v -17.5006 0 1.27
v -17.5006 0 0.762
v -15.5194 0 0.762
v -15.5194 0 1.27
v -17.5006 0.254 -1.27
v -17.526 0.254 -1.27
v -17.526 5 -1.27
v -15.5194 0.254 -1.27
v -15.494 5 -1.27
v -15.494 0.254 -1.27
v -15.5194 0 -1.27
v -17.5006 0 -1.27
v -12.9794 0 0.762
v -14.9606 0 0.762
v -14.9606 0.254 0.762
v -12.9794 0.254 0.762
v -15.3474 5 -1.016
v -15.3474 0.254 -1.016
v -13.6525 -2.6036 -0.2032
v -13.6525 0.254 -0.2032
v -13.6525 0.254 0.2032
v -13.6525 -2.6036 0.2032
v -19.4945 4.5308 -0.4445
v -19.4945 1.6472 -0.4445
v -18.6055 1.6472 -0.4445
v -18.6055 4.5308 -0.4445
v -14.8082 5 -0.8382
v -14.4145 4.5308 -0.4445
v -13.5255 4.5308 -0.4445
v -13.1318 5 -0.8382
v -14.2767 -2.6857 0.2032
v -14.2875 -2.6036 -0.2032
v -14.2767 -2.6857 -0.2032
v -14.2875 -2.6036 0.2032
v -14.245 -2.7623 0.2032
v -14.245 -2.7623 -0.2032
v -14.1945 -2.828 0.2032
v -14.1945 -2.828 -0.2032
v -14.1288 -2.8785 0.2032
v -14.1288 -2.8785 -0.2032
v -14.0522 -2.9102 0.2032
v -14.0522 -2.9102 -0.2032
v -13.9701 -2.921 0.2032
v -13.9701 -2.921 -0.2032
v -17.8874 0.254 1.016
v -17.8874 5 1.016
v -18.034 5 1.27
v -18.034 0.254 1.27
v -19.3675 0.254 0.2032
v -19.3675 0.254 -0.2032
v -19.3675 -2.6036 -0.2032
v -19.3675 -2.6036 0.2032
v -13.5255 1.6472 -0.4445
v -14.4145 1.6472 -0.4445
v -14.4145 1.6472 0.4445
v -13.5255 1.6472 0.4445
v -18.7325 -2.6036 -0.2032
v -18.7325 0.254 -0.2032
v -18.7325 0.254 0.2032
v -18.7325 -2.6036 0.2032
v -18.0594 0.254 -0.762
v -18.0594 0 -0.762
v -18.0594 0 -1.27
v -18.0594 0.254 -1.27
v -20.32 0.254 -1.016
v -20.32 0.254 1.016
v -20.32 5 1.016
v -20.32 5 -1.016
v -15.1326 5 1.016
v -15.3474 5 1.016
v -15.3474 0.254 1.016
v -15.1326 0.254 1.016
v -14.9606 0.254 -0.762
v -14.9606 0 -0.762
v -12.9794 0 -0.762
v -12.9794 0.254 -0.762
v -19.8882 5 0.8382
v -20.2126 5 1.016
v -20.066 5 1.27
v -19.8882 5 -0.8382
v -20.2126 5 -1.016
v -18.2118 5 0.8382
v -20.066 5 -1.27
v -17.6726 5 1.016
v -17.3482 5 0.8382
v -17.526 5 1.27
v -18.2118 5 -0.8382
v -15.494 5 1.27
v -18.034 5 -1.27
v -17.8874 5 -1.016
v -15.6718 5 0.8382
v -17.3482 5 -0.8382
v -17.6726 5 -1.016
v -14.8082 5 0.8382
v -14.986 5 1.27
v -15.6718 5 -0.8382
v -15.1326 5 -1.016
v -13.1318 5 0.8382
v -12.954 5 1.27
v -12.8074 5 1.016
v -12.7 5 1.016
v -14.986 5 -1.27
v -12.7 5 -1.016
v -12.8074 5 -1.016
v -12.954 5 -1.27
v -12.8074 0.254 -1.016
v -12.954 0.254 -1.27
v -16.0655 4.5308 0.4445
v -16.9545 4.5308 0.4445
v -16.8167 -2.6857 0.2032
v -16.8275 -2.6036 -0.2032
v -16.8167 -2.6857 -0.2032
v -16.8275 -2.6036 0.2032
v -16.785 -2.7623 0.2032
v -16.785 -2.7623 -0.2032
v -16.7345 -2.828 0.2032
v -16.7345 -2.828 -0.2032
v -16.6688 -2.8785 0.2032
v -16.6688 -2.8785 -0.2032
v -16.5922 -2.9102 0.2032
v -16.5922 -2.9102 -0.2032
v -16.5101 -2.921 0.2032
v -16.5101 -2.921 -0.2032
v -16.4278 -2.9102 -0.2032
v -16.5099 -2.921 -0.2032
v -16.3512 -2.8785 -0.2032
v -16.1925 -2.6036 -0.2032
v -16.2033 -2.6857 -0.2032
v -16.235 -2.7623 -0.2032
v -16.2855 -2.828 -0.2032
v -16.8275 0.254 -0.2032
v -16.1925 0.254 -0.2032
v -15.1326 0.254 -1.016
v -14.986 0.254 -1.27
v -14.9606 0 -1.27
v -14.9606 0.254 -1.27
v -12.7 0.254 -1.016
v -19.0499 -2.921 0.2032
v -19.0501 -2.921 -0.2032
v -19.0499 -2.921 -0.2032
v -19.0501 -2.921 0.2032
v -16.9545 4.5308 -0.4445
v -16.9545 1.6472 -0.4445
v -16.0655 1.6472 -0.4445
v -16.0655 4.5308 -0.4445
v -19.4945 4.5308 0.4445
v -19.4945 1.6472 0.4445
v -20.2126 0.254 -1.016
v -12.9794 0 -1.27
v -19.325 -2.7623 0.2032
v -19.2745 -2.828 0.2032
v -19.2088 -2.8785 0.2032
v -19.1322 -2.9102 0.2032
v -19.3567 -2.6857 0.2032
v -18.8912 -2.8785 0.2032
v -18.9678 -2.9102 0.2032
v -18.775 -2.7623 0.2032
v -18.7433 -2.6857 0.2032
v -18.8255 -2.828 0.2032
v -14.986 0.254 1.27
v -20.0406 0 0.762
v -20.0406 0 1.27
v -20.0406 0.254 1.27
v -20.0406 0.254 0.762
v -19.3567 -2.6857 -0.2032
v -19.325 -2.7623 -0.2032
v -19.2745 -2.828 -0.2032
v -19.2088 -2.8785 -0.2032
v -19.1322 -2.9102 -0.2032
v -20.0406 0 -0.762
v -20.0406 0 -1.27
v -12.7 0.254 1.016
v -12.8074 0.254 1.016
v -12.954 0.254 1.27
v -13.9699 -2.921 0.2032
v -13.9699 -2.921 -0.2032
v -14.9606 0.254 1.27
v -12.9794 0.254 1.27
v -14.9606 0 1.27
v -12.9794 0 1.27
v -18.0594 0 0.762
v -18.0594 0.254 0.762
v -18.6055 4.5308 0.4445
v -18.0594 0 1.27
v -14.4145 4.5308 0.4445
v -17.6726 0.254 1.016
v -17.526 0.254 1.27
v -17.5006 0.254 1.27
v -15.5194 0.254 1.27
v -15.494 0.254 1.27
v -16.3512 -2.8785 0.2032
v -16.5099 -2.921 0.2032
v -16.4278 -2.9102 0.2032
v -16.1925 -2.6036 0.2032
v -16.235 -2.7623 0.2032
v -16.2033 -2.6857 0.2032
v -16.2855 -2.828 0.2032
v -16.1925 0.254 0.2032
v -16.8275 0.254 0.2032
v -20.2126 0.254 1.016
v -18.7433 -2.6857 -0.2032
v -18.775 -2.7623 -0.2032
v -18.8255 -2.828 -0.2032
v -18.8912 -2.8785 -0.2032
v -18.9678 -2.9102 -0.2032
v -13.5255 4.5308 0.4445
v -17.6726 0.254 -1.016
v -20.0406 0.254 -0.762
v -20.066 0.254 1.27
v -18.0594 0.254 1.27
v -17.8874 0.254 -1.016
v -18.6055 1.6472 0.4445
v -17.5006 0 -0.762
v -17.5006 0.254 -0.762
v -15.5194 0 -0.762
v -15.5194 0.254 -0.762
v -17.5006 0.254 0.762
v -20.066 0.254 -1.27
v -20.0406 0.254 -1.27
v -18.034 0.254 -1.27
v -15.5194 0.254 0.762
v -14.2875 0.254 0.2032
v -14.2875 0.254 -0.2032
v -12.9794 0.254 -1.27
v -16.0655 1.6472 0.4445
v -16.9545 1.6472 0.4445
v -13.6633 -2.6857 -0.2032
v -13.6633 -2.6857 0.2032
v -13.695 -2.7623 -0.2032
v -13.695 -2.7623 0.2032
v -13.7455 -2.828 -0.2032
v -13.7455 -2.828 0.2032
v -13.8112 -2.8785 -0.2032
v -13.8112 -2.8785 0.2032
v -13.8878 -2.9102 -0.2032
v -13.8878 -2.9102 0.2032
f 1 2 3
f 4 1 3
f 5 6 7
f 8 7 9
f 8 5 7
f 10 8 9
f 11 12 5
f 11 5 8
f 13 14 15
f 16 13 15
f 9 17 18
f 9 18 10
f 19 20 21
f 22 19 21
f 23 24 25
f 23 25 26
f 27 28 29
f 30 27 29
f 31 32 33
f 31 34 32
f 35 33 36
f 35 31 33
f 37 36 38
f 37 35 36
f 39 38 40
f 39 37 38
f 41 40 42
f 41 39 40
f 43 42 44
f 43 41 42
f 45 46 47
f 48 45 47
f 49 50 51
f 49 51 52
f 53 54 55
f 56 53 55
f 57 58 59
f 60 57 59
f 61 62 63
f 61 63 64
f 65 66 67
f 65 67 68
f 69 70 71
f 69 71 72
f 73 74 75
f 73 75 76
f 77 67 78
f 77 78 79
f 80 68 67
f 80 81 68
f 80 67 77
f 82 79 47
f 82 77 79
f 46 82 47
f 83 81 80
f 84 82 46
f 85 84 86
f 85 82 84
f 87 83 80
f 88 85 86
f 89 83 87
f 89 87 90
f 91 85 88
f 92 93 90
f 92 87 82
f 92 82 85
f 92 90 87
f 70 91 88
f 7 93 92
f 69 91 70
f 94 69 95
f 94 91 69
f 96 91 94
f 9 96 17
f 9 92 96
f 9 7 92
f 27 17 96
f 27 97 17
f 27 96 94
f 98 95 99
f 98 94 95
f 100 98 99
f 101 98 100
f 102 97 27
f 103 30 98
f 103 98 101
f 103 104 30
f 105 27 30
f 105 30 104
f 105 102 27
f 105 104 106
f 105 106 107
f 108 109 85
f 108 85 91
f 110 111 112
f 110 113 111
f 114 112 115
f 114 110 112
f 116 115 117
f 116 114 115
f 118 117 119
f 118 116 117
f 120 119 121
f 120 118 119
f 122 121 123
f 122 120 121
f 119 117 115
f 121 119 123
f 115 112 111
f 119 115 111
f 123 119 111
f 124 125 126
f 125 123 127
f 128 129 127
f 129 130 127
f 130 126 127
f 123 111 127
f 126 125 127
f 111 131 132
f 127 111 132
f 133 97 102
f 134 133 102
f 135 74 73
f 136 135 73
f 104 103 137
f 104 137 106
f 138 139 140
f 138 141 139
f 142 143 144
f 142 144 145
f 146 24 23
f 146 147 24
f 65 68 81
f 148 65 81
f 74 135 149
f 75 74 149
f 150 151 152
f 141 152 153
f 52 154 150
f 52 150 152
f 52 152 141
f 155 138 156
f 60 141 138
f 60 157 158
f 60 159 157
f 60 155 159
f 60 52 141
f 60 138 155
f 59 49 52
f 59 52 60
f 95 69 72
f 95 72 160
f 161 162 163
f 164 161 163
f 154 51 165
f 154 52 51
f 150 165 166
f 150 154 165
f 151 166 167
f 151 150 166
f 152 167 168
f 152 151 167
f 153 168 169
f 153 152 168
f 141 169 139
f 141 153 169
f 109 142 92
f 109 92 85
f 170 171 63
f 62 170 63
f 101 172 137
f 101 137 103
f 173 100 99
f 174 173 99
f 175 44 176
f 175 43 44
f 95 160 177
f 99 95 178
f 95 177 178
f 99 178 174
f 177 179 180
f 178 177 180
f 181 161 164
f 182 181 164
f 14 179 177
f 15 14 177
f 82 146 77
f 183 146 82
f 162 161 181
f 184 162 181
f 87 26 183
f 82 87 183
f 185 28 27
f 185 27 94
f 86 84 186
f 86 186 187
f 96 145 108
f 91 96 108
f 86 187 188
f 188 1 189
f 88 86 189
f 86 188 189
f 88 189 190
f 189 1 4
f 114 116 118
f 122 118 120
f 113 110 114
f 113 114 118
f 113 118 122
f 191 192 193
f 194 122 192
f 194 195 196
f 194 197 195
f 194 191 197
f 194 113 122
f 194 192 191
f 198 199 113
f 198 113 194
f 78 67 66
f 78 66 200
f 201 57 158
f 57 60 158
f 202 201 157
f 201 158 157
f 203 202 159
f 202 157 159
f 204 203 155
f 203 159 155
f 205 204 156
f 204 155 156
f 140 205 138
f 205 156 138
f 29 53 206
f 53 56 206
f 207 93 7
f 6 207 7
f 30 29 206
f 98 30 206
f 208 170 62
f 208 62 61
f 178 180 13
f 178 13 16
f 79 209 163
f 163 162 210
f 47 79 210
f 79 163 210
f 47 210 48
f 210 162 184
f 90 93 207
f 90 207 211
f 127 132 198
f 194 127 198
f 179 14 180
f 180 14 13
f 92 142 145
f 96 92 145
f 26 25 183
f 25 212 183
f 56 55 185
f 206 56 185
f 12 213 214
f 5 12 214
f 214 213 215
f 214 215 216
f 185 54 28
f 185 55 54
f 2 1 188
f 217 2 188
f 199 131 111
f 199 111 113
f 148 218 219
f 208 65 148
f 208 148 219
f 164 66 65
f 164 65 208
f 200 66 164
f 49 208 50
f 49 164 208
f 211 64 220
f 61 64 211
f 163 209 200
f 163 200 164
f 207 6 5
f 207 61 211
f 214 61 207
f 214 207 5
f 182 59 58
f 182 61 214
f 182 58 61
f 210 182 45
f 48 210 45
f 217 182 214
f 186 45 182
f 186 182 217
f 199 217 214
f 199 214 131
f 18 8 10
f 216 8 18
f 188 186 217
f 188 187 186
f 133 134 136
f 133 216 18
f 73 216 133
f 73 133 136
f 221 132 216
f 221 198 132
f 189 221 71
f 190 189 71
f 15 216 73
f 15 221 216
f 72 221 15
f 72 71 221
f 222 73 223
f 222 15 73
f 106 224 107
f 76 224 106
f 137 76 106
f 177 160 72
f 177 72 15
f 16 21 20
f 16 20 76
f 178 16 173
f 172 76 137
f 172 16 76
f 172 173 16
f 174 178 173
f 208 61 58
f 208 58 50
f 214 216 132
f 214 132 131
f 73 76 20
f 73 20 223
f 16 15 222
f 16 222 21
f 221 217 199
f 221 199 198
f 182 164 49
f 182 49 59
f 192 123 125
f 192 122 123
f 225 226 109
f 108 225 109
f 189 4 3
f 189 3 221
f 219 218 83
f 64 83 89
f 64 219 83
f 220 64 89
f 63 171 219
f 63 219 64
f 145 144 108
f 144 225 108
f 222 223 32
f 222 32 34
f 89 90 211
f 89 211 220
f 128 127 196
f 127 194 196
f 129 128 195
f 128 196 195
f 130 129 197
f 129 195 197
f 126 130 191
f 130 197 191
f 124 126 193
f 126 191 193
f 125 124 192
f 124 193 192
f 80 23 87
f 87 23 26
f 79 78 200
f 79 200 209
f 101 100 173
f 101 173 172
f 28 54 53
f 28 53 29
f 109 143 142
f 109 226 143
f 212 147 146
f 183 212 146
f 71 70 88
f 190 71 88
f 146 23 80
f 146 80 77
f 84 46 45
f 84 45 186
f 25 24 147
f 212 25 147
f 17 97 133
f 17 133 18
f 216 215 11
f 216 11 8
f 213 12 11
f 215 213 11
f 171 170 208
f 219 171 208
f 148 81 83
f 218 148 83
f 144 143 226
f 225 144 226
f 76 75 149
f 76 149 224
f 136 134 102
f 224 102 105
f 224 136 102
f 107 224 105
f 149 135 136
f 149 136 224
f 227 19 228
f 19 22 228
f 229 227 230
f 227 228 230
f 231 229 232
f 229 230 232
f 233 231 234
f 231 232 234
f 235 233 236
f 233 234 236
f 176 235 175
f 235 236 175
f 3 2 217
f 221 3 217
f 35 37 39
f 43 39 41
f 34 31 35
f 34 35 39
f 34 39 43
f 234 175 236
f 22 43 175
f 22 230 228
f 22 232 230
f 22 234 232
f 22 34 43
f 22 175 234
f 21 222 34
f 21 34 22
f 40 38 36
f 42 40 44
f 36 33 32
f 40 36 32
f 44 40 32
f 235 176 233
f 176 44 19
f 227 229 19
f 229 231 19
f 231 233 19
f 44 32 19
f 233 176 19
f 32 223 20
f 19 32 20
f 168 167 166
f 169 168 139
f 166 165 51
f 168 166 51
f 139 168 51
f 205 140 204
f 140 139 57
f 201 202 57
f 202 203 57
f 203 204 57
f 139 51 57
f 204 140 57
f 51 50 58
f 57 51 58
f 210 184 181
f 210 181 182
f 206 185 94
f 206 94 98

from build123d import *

# Parameters (mm, degrees)
SKETCH1_W                      = 40.64
SKETCH1_H                      = 2.54
BASE_EXTRUDE_DEPTH             = 5
SKETCH2_W                      = 1.524
SKETCH2_H                      = 0.254
STANDOFF_WIDTH_DEPTH           = 41.966114046
UPPER_START                    = -19.4945
UPPER_CORE_OUTLINE_W           = 3.3528
UPPER_CORE_OUTLINE_H           = 0.889
UPPER_CORE_DEPTH               = 0.889
LEAD_IN_SIZE                   = 0.3937
LEAD_IN_SIZE2                  = 0.469193389
CORE_PATTERN_COUNT             = 16
CORE_PATTERN_PITCH             = 2.54
LEAD_IN_OF_CORE_PATTERN_SIZE2  = 0.469193389
LEAD_IN_OF_CORE_PATTERN_SIZE   = 0.3937
POSITION_CUT_DEPTH             = 21.964620197
SKETCH10_W                     = 0.2794
SKETCH10_H                     = 0.254
STANDOFF_LENGTH_DEPTH          = 22.07970588
STANDOFF_PATTERN_COUNT         = 16
STANDOFF_PATTERN_PITCH         = 2.54
SKETCH11_W                     = 0.635
SKETCH11_H                     = 0.4064
TAIL_DEPTH                     = 3.175
TAIL_FILLETS_R                 = 0.3175
TAIL_PATTERN_COUNT             = 16
TAIL_PATTERN_PITCH             = 2.54
TAIL_FILLETS_OF_TAIL_PATTERN_R = 0.3175
SKETCH12_W                     = 33.02
SKETCH12_H                     = 7.921
CUT_EXTRUDE1_DEPTH             = 22.07970588


# Read off the part's stored shape, not the designer's step: Upper Core
with BuildPart() as part:
    # Sketch1 → Base-Extrude (new body)
    with BuildSketch(Plane(origin=(0, 0, 0), x_dir=(1, 0, 0), z_dir=(0, 1, 0))):
        Rectangle(SKETCH1_W, SKETCH1_H)
    extrude(amount=BASE_EXTRUDE_DEPTH)

    # Sketch2 → Standoff - Width (cut, through all)
    with BuildSketch(Plane.ZY.offset(20.32)):
        with Locations((0, 0.127)):
            Rectangle(SKETCH2_W, SKETCH2_H)
    extrude(amount=-STANDOFF_WIDTH_DEPTH, mode=Mode.SUBTRACT)

    # Upper Core outline → Upper Core (cut)
    with BuildSketch(Plane.YZ.offset(UPPER_START)):
        with Locations((3.3236, 0)):
            Rectangle(UPPER_CORE_OUTLINE_W, UPPER_CORE_OUTLINE_H)
    upper_core = extrude(amount=UPPER_CORE_DEPTH, mode=Mode.SUBTRACT)

    # Lead-in
    lead_in_edges = [part.edges().sort_by_distance(p)[0] for p in [
        (-19.4945, 5, 0),
        (-19.05, 5, 0.4445),
        (-18.6055, 5, 0),
        (-19.05, 5, -0.4445),
    ]]
    lead_in_side = [part.faces().sort_by_distance(p)[0] for p in [
        (0.146976854, 5, 0),
    ]]
    chamfer(lead_in_edges, length=LEAD_IN_SIZE, length2=LEAD_IN_SIZE2, reference=lead_in_side[0])

    # Core Pattern: Upper Core ×16
    with Locations(*[(i * CORE_PATTERN_PITCH, 0, 0) for i in range(1, CORE_PATTERN_COUNT)]):
        add(upper_core, mode=Mode.SUBTRACT)

    # Lead-in of Core Pattern
    lead_in_of_core_pattern_edges = [part.edges().sort_by_distance(p)[0] for p in [
        (-16.9545, 5, 0),
        (-16.51, 5, 0.4445),
        (-16.0655, 5, 0),
        (-16.51, 5, -0.4445),
        (-14.4145, 5, 0),
        (-13.97, 5, 0.4445),
        (-13.5255, 5, 0),
        (-13.97, 5, -0.4445),
        (-11.8745, 5, 0),
        (-11.43, 5, 0.4445),
        (-10.9855, 5, 0),
        (-11.43, 5, -0.4445),
        (-9.3345, 5, 0),
        (-8.89, 5, 0.4445),
        (-8.4455, 5, 0),
        (-8.89, 5, -0.4445),
        (-6.7945, 5, 0),
        (-6.35, 5, 0.4445),
        (-5.9055, 5, 0),
        (-6.35, 5, -0.4445),
        (-4.2545, 5, 0),
        (-3.81, 5, 0.4445),
        (-3.3655, 5, 0),
        (-3.81, 5, -0.4445),
        (-1.7145, 5, 0),
        (-1.27, 5, 0.4445),
        (-0.8255, 5, 0),
        (-1.27, 5, -0.4445),
        (0.8255, 5, 0),
        (1.27, 5, 0.4445),
        (1.7145, 5, 0),
        (1.27, 5, -0.4445),
        (3.3655, 5, 0),
        (3.81, 5, 0.4445),
        (4.2545, 5, 0),
        (3.81, 5, -0.4445),
        (5.9055, 5, 0),
        (6.35, 5, 0.4445),
        (6.7945, 5, 0),
        (6.35, 5, -0.4445),
        (8.4455, 5, 0),
        (8.89, 5, 0.4445),
        (9.3345, 5, 0),
        (8.89, 5, -0.4445),
        (10.9855, 5, 0),
        (11.43, 5, 0.4445),
        (11.8745, 5, 0),
        (11.43, 5, -0.4445),
        (13.5255, 5, 0),
        (13.97, 5, 0.4445),
        (14.4145, 5, 0),
        (13.97, 5, -0.4445),
        (16.0655, 5, 0),
        (16.51, 5, 0.4445),
        (16.9545, 5, 0),
        (16.51, 5, -0.4445),
        (18.6055, 5, 0),
        (19.05, 5, 0.4445),
        (19.4945, 5, 0),
        (19.05, 5, -0.4445),
    ]]
    chamfer(lead_in_of_core_pattern_edges, length=LEAD_IN_OF_CORE_PATTERN_SIZE, length2=LEAD_IN_OF_CORE_PATTERN_SIZE2)

    # Sketch4 → Position Cut (cut, through all)
    with BuildSketch(Plane(origin=(0, 5, 0), x_dir=(-1, 0, 0), z_dir=(0, 1, 0))):
        Polygon((20.32, 1.016), (20.212646968, 1.016), (20.066, 1.27), (20.32, 1.27), align=None)
        Polygon((20.066, -1.27), (20.32, -1.27), (20.32, -1.016), (20.212646968, -1.016), align=None)
        Polygon((17.78, -1.016), (17.887353032, -1.016), (18.034, -1.27), (17.78, -1.27), align=None)
        Polygon((18.034, 1.27), (17.78, 1.27), (17.78, 1.016), (17.887353032, 1.016), align=None)
    position_cut = extrude(amount=-POSITION_CUT_DEPTH, mode=Mode.SUBTRACT)

    # Sketch10 → Standoff - Length (cut, through all)
    with BuildSketch(Plane.XY.offset(1.27)):
        with Locations((-17.9197, 0.127)):
            Rectangle(SKETCH10_W, SKETCH10_H)
        with Locations((-20.1803, 0.127)):
            Rectangle(SKETCH10_W, SKETCH10_H)
    standoff_length = extrude(amount=-STANDOFF_LENGTH_DEPTH, mode=Mode.SUBTRACT)

    # Standoff Pattern: Position Cut, Standoff - Length ×16
    with Locations(*[(i * STANDOFF_PATTERN_PITCH, 0, 0) for i in range(1, STANDOFF_PATTERN_COUNT)]):
        add(position_cut, mode=Mode.SUBTRACT)
        add(standoff_length, mode=Mode.SUBTRACT)

    # Sketch11 → Tail (add)
    with BuildSketch(Plane.XZ.offset(-0.254)):
        with Locations((-19.05, 0)):
            Rectangle(SKETCH11_W, SKETCH11_H)
    tail = extrude(amount=TAIL_DEPTH)

    # Tail Fillets
    tail_fillets_edges = [part.edges().sort_by_distance(p)[0] for p in [
        (-19.3675, -2.921, 0),
        (-18.7325, -2.921, 0),
    ]]
    fillet(tail_fillets_edges, radius=TAIL_FILLETS_R - 0.0001)  # a hair under: the kernel refuses the full size

    # Tail Pattern: Tail ×16
    with Locations(*[(i * TAIL_PATTERN_PITCH, 0, 0) for i in range(1, TAIL_PATTERN_COUNT)]):
        add(tail)

    # Tail Fillets of Tail Pattern
    tail_fillets_of_tail_pattern_edges = [part.edges().sort_by_distance(p)[0] for p in [
        (-16.8275, -2.921, 0),
        (-16.1925, -2.921, 0),
        (-14.2875, -2.921, 0),
        (-13.6525, -2.921, 0),
        (-11.7475, -2.921, 0),
        (-11.1125, -2.921, 0),
        (-9.2075, -2.921, 0),
        (-8.5725, -2.921, 0),
        (-6.6675, -2.921, 0),
        (-6.0325, -2.921, 0),
        (-4.1275, -2.921, 0),
        (-3.4925, -2.921, 0),
        (-1.5875, -2.921, 0),
        (-0.9525, -2.921, 0),
        (0.9525, -2.921, 0),
        (1.5875, -2.921, 0),
        (3.4925, -2.921, 0),
        (4.1275, -2.921, 0),
        (6.0325, -2.921, 0),
        (6.6675, -2.921, 0),
        (8.5725, -2.921, 0),
        (9.2075, -2.921, 0),
        (11.1125, -2.921, 0),
        (11.7475, -2.921, 0),
        (13.6525, -2.921, 0),
        (14.2875, -2.921, 0),
        (16.1925, -2.921, 0),
        (16.8275, -2.921, 0),
        (18.7325, -2.921, 0),
        (19.3675, -2.921, 0),
    ]]
    fillet(tail_fillets_of_tail_pattern_edges, radius=TAIL_FILLETS_OF_TAIL_PATTERN_R - 0.0001)  # a hair under: the kernel refuses the full size

    # Sketch12 → Cut-Extrude1 (cut, through all)
    with BuildSketch(Plane.XY.offset(1.27)):
        with Locations((3.81, 1.0395)):
            Rectangle(SKETCH12_W, SKETCH12_H)
    extrude(amount=-CUT_EXTRUDE1_DEPTH, mode=Mode.SUBTRACT)


solid = part.part
